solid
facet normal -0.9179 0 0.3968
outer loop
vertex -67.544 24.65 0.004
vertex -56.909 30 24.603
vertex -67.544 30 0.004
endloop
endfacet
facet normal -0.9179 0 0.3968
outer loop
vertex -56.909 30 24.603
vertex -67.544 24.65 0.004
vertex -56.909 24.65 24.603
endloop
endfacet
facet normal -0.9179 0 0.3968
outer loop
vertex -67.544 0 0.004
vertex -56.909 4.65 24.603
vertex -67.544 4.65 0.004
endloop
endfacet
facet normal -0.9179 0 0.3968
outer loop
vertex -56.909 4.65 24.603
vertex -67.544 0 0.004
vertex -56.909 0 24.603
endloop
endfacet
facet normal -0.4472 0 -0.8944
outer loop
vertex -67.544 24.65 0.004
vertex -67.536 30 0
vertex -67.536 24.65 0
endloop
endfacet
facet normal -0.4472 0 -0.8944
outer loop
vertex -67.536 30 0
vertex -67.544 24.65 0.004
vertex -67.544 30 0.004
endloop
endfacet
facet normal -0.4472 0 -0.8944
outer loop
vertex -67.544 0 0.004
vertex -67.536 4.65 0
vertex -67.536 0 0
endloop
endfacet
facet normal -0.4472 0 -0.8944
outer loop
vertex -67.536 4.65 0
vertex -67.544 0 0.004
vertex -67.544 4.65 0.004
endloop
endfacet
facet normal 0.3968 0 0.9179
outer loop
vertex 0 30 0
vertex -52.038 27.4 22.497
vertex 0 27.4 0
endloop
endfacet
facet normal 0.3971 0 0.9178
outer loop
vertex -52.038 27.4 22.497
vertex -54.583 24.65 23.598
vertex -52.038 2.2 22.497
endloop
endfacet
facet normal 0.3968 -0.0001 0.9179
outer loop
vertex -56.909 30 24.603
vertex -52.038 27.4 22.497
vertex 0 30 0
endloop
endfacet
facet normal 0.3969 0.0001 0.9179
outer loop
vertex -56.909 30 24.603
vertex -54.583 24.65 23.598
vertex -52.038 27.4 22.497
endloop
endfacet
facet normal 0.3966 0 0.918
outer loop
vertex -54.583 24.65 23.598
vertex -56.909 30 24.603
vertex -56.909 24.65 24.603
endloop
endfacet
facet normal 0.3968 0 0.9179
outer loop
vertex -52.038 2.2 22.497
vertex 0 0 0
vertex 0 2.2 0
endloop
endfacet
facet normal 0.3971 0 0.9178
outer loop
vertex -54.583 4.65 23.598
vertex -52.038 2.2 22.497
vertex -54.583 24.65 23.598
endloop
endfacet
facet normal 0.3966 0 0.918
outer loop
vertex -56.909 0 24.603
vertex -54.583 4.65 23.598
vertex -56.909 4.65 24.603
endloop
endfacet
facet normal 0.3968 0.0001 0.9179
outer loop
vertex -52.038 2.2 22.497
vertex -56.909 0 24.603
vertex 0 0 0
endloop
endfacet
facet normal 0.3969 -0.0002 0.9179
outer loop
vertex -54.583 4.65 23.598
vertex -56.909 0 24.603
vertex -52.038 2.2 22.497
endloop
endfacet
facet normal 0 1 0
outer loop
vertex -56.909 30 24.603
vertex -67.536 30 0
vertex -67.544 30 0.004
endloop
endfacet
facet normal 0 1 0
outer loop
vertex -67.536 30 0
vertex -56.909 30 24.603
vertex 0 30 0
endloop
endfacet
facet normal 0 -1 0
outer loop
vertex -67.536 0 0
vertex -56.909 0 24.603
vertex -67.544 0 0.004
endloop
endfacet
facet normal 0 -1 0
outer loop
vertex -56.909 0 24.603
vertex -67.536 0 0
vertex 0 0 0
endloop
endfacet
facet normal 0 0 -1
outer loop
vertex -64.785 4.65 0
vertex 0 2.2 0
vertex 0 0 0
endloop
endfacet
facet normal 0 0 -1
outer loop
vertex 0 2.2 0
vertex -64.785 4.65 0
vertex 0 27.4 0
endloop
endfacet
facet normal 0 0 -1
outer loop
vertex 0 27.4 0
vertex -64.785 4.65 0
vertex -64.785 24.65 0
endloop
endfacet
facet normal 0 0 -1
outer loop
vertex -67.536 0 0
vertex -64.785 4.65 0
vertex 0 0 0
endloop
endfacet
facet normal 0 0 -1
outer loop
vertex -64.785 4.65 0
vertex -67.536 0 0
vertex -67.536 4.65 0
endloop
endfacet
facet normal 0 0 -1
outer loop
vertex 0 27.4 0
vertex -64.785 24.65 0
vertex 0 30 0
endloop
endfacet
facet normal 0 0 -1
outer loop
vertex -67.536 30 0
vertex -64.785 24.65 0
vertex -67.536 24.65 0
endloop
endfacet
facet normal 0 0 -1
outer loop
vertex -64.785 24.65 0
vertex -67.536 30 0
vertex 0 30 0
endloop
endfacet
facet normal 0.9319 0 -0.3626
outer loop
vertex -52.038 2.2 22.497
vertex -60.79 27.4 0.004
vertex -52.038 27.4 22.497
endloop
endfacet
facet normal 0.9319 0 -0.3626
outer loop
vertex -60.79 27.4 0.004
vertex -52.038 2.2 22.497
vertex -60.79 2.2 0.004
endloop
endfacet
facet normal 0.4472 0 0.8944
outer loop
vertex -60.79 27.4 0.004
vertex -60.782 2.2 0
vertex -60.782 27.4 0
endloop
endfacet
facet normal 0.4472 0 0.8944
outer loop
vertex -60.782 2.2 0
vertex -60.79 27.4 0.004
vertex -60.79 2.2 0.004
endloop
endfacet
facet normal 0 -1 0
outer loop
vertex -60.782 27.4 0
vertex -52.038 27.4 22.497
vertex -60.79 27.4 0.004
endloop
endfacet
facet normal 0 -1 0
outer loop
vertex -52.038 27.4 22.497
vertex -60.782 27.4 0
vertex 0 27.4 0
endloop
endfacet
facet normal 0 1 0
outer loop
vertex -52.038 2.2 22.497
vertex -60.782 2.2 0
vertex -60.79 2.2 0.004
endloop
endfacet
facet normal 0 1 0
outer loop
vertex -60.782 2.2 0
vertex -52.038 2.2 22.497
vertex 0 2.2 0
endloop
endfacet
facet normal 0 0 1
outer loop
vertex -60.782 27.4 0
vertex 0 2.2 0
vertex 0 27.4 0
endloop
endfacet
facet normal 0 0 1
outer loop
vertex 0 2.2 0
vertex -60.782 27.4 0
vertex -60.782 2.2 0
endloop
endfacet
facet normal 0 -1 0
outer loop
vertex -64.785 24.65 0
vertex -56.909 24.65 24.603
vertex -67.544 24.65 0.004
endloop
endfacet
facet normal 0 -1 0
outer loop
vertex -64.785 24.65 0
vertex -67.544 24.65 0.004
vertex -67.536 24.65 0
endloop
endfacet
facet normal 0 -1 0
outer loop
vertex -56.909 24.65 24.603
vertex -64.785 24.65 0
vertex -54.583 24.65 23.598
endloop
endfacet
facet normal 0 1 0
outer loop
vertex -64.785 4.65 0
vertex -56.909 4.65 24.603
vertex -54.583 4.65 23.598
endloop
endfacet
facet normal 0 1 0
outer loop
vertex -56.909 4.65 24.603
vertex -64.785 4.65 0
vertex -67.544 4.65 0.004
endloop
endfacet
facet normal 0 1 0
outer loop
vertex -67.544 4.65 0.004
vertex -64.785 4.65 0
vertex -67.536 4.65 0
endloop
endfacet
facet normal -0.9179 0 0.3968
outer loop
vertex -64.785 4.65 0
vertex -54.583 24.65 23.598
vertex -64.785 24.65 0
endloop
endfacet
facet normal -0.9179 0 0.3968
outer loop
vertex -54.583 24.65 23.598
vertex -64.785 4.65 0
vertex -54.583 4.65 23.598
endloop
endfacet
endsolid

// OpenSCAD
dim = [62,30,26.8];

module basic() difference() {
    cube(dim);
    translate([0,-1]) rotate([0,-23.38,0]) cube([74-6.45, dim.y + 2, dim.z]);
}

difference() {
    rotate([0, 23.38]) rotate([0, 180]) basic();
    translate([0, 2.2, 0]) scale([0.9, 0.84, 1.]) rotate([0, 23.38]) rotate([0, 180]) basic(); basic();
    translate([-68.7, 9.3/2, -2]) rotate([0, 23.38, 0]) cube([2.8,20,30]);
}
